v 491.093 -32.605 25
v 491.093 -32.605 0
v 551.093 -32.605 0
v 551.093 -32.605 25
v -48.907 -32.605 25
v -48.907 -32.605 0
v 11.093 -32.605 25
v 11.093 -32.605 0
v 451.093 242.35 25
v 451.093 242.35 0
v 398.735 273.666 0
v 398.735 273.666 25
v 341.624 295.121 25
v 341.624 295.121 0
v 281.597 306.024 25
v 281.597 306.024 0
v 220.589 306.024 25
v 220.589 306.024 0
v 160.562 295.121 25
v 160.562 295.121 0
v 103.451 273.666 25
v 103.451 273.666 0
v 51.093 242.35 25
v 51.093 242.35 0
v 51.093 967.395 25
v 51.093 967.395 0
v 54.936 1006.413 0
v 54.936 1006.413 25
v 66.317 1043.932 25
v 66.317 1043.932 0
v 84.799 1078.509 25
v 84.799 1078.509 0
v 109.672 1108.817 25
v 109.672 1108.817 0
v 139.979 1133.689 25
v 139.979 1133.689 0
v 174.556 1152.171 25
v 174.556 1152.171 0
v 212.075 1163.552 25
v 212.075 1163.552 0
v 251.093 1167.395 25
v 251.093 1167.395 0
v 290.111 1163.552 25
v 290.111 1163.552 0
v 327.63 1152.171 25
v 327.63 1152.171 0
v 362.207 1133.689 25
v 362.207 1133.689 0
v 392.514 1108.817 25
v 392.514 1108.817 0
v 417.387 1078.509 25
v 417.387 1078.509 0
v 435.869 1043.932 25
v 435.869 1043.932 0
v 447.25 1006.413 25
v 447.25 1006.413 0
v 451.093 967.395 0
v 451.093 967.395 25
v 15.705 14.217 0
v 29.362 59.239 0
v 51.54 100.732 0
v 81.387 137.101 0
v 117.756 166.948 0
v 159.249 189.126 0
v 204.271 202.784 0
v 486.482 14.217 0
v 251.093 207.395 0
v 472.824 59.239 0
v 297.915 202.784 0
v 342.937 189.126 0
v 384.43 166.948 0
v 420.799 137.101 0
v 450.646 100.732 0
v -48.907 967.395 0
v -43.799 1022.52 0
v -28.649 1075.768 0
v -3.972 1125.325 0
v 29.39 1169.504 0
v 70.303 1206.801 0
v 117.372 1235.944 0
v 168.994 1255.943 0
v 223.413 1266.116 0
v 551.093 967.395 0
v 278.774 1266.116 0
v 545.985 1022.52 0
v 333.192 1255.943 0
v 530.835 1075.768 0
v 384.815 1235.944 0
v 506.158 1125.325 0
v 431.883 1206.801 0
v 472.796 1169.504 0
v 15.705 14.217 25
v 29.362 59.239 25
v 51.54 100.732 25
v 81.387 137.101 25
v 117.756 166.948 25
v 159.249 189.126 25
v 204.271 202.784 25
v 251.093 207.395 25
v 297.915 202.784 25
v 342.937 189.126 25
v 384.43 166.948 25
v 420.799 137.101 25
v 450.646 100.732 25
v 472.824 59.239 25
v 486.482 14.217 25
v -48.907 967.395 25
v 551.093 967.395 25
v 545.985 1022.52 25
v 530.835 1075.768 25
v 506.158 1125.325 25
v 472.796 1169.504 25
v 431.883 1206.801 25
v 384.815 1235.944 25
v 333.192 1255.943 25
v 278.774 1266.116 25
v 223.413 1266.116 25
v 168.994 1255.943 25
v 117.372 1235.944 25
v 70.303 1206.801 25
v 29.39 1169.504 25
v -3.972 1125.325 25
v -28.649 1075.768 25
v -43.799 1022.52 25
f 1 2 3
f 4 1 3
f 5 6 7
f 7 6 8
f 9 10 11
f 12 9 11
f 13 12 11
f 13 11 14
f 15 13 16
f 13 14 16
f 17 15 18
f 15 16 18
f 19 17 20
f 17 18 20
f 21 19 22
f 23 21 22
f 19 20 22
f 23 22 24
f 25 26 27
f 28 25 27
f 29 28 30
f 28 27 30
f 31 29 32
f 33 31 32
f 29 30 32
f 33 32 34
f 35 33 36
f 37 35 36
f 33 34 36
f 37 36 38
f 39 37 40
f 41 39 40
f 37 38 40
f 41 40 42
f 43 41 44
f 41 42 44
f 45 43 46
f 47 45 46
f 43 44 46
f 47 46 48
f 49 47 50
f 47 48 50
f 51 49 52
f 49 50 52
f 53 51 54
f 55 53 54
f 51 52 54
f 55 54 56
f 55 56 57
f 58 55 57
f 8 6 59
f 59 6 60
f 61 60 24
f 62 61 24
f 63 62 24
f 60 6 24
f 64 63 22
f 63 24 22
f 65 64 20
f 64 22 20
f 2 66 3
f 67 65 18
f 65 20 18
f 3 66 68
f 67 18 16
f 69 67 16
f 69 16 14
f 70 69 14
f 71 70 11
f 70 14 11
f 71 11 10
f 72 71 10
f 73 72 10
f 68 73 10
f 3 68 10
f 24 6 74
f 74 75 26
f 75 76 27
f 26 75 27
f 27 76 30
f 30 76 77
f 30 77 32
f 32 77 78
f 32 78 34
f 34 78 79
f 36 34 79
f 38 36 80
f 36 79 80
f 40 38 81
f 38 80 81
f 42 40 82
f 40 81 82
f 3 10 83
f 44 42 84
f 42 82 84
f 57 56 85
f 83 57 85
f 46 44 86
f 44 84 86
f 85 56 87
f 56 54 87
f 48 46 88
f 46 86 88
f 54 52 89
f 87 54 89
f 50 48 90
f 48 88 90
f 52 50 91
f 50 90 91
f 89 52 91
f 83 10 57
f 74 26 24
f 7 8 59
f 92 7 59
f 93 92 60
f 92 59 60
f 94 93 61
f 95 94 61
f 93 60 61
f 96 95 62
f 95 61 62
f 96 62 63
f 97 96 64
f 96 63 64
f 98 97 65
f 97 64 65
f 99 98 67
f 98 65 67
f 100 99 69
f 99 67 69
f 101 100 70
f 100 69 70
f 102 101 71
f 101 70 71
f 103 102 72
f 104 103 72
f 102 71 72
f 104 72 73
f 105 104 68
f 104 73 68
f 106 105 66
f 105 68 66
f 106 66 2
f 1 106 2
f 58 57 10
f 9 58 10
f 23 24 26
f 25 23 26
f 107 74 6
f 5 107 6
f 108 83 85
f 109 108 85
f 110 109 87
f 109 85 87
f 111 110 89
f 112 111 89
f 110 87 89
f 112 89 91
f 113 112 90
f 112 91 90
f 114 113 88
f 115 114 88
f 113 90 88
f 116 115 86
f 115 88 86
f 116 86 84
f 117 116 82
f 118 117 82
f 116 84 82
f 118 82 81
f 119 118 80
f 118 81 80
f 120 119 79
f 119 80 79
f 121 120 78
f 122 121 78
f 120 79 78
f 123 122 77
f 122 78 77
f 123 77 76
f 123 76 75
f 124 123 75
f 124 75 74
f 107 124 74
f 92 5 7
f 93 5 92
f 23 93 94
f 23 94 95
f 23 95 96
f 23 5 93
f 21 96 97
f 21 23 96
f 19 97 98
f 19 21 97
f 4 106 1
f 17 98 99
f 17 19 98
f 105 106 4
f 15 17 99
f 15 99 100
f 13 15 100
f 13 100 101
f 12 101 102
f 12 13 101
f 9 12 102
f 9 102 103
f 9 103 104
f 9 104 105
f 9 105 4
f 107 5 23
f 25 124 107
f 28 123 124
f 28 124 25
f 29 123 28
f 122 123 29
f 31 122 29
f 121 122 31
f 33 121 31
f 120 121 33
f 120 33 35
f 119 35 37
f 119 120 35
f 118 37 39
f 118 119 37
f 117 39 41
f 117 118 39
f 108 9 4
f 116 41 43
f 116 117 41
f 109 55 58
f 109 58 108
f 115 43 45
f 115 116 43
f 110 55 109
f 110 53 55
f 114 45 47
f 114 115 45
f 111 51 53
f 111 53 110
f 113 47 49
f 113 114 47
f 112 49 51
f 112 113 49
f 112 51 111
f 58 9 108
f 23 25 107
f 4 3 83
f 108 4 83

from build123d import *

# Parameters (mm, degrees)
F1_DEPTH = 25


with BuildPart() as f1:
    # F0 (on Top) → F1 (new body)
    with BuildSketch(Plane.XY):
        with BuildLine():
            Line((-48.90696, 967.395362), (-48.90696, -32.604638))
            Line((-48.90696, -32.604638), (11.09304, -32.604638))
            ThreePointArc((11.09304, -32.604638), (251.09304, 207.395362), (491.09304, -32.604638))
            Line((491.09304, -32.604638), (551.09304, -32.604638))
            Line((551.09304, -32.604638), (551.09304, 967.395362))
            ThreePointArc((551.09304, 967.395362), (251.09304, 1267.395362), (-48.90696, 967.395362))
        make_face()
        with BuildLine():
            Line((451.09304, 967.395362), (451.09304, 242.349903))
            ThreePointArc((451.09304, 242.349903), (251.09304, 307.395362), (51.09304, 242.349903))
            Line((51.09304, 242.349903), (51.09304, 967.395362))
            ThreePointArc((51.09304, 967.395362), (251.09304, 1167.395362), (451.09304, 967.395362))
        make_face(mode=Mode.SUBTRACT)
    extrude(amount=F1_DEPTH)


solid = f1.part
